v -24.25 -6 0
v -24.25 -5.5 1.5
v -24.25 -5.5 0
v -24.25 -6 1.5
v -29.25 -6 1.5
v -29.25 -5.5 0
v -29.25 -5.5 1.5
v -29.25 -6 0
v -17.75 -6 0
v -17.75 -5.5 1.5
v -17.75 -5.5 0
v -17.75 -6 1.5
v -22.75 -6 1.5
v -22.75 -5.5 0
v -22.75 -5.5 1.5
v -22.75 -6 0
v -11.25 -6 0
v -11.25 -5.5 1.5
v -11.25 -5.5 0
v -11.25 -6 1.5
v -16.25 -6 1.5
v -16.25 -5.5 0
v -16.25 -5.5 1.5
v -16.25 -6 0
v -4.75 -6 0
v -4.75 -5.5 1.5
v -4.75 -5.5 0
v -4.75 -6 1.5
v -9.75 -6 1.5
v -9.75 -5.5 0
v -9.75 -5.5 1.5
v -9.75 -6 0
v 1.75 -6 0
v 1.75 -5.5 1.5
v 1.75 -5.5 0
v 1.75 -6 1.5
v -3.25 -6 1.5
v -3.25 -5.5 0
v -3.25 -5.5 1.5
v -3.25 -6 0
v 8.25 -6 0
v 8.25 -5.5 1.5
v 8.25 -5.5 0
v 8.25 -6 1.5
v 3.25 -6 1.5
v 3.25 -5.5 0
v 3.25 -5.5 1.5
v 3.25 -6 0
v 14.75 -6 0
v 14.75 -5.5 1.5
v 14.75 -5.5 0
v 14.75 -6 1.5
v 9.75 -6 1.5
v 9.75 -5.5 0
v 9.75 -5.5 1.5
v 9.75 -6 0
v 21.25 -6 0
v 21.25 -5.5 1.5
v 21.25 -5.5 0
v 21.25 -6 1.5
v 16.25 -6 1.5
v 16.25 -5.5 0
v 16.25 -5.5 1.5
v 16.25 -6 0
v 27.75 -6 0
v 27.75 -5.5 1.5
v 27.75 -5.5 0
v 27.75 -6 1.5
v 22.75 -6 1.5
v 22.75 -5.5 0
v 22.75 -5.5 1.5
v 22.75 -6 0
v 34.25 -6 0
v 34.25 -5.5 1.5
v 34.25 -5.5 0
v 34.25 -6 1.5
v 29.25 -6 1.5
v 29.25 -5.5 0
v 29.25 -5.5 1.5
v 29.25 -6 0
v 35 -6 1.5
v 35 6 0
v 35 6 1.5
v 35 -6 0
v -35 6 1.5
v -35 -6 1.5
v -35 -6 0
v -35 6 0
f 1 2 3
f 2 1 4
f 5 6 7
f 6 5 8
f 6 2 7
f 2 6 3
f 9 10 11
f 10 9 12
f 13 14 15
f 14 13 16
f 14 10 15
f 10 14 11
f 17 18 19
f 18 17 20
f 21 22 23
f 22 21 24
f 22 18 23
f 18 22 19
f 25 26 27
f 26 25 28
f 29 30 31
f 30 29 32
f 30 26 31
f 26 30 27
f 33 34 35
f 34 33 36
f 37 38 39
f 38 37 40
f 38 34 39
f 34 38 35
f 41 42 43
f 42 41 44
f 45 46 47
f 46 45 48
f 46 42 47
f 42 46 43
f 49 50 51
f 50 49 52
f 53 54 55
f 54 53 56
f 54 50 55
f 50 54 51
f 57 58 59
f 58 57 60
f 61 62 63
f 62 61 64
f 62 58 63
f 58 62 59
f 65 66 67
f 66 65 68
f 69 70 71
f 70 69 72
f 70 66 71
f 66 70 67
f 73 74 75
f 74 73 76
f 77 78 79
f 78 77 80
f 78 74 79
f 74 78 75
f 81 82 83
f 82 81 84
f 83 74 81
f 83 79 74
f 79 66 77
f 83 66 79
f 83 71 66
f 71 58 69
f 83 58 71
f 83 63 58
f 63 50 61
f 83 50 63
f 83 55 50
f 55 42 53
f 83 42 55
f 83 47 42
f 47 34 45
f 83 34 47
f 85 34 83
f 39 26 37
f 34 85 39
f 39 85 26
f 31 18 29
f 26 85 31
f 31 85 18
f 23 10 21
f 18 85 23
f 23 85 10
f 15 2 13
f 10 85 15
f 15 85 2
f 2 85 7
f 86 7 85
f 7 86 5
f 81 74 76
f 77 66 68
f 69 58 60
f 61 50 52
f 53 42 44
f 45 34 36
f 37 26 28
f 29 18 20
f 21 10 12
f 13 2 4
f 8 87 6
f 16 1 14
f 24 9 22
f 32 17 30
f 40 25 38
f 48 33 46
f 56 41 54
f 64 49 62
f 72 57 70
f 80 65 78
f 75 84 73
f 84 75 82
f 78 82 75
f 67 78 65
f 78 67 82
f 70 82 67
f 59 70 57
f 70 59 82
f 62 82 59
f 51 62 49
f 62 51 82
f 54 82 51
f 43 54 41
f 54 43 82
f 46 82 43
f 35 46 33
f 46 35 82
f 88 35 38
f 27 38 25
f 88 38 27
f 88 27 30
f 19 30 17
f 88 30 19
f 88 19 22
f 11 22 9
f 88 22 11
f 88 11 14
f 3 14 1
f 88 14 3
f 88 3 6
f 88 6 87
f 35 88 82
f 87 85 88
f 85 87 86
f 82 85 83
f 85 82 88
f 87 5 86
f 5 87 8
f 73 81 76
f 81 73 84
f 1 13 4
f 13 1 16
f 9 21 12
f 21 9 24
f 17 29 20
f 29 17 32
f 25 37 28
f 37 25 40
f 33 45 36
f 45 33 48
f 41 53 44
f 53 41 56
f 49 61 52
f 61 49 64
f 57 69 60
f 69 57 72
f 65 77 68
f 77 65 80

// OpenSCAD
// 10-well agarose gel comb - printed lying flat
// Units: mm

plate_t     = 1.5;    // plate thickness (Z)
spine_l     = 70;     // spine length (X)
spine_w     = 12;     // spine width (Y)
teeth_n     = 10;     // number of teeth
teeth_w     = 5;      // tooth width (X)
teeth_l     = 12;     // tooth length (Y)
gap         = 1.5;    // gap between teeth (X)
eps         = 0.5;    // overcut past faces

pitch = teeth_w + gap;

difference() {
    // Spine
    translate([-spine_l/2, -spine_w/2, 0])
        cube([spine_l, spine_w, plate_t]);

    // Teeth, centred on spine in X
    for (i = [0 : teeth_n - 1])
        translate([(i - (teeth_n - 1)/2) * pitch, -spine_w/2 - teeth_l, -eps])
            cube([teeth_w, teeth_l + eps, plate_t + 2*eps]);
}
